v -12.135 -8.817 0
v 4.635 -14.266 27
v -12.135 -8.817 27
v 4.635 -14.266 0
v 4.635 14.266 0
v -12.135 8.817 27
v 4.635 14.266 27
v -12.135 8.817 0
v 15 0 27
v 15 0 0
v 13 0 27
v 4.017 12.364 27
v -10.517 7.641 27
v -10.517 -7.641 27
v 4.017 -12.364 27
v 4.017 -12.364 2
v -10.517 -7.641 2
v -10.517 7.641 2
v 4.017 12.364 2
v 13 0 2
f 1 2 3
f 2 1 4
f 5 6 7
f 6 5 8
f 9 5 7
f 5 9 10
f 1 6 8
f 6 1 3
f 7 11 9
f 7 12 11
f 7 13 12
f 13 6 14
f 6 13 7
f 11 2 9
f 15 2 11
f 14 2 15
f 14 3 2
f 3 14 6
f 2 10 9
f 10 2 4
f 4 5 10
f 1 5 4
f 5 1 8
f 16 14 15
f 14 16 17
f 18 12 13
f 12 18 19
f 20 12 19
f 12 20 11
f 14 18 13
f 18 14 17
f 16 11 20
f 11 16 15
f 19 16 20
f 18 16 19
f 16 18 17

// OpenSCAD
difference(){
cylinder(h=27,r1=15,r2=15,$fn=5);
    translate([0,0,2])
    cylinder(h=25.5,r1=13,r2=13,$fn=5);
}
